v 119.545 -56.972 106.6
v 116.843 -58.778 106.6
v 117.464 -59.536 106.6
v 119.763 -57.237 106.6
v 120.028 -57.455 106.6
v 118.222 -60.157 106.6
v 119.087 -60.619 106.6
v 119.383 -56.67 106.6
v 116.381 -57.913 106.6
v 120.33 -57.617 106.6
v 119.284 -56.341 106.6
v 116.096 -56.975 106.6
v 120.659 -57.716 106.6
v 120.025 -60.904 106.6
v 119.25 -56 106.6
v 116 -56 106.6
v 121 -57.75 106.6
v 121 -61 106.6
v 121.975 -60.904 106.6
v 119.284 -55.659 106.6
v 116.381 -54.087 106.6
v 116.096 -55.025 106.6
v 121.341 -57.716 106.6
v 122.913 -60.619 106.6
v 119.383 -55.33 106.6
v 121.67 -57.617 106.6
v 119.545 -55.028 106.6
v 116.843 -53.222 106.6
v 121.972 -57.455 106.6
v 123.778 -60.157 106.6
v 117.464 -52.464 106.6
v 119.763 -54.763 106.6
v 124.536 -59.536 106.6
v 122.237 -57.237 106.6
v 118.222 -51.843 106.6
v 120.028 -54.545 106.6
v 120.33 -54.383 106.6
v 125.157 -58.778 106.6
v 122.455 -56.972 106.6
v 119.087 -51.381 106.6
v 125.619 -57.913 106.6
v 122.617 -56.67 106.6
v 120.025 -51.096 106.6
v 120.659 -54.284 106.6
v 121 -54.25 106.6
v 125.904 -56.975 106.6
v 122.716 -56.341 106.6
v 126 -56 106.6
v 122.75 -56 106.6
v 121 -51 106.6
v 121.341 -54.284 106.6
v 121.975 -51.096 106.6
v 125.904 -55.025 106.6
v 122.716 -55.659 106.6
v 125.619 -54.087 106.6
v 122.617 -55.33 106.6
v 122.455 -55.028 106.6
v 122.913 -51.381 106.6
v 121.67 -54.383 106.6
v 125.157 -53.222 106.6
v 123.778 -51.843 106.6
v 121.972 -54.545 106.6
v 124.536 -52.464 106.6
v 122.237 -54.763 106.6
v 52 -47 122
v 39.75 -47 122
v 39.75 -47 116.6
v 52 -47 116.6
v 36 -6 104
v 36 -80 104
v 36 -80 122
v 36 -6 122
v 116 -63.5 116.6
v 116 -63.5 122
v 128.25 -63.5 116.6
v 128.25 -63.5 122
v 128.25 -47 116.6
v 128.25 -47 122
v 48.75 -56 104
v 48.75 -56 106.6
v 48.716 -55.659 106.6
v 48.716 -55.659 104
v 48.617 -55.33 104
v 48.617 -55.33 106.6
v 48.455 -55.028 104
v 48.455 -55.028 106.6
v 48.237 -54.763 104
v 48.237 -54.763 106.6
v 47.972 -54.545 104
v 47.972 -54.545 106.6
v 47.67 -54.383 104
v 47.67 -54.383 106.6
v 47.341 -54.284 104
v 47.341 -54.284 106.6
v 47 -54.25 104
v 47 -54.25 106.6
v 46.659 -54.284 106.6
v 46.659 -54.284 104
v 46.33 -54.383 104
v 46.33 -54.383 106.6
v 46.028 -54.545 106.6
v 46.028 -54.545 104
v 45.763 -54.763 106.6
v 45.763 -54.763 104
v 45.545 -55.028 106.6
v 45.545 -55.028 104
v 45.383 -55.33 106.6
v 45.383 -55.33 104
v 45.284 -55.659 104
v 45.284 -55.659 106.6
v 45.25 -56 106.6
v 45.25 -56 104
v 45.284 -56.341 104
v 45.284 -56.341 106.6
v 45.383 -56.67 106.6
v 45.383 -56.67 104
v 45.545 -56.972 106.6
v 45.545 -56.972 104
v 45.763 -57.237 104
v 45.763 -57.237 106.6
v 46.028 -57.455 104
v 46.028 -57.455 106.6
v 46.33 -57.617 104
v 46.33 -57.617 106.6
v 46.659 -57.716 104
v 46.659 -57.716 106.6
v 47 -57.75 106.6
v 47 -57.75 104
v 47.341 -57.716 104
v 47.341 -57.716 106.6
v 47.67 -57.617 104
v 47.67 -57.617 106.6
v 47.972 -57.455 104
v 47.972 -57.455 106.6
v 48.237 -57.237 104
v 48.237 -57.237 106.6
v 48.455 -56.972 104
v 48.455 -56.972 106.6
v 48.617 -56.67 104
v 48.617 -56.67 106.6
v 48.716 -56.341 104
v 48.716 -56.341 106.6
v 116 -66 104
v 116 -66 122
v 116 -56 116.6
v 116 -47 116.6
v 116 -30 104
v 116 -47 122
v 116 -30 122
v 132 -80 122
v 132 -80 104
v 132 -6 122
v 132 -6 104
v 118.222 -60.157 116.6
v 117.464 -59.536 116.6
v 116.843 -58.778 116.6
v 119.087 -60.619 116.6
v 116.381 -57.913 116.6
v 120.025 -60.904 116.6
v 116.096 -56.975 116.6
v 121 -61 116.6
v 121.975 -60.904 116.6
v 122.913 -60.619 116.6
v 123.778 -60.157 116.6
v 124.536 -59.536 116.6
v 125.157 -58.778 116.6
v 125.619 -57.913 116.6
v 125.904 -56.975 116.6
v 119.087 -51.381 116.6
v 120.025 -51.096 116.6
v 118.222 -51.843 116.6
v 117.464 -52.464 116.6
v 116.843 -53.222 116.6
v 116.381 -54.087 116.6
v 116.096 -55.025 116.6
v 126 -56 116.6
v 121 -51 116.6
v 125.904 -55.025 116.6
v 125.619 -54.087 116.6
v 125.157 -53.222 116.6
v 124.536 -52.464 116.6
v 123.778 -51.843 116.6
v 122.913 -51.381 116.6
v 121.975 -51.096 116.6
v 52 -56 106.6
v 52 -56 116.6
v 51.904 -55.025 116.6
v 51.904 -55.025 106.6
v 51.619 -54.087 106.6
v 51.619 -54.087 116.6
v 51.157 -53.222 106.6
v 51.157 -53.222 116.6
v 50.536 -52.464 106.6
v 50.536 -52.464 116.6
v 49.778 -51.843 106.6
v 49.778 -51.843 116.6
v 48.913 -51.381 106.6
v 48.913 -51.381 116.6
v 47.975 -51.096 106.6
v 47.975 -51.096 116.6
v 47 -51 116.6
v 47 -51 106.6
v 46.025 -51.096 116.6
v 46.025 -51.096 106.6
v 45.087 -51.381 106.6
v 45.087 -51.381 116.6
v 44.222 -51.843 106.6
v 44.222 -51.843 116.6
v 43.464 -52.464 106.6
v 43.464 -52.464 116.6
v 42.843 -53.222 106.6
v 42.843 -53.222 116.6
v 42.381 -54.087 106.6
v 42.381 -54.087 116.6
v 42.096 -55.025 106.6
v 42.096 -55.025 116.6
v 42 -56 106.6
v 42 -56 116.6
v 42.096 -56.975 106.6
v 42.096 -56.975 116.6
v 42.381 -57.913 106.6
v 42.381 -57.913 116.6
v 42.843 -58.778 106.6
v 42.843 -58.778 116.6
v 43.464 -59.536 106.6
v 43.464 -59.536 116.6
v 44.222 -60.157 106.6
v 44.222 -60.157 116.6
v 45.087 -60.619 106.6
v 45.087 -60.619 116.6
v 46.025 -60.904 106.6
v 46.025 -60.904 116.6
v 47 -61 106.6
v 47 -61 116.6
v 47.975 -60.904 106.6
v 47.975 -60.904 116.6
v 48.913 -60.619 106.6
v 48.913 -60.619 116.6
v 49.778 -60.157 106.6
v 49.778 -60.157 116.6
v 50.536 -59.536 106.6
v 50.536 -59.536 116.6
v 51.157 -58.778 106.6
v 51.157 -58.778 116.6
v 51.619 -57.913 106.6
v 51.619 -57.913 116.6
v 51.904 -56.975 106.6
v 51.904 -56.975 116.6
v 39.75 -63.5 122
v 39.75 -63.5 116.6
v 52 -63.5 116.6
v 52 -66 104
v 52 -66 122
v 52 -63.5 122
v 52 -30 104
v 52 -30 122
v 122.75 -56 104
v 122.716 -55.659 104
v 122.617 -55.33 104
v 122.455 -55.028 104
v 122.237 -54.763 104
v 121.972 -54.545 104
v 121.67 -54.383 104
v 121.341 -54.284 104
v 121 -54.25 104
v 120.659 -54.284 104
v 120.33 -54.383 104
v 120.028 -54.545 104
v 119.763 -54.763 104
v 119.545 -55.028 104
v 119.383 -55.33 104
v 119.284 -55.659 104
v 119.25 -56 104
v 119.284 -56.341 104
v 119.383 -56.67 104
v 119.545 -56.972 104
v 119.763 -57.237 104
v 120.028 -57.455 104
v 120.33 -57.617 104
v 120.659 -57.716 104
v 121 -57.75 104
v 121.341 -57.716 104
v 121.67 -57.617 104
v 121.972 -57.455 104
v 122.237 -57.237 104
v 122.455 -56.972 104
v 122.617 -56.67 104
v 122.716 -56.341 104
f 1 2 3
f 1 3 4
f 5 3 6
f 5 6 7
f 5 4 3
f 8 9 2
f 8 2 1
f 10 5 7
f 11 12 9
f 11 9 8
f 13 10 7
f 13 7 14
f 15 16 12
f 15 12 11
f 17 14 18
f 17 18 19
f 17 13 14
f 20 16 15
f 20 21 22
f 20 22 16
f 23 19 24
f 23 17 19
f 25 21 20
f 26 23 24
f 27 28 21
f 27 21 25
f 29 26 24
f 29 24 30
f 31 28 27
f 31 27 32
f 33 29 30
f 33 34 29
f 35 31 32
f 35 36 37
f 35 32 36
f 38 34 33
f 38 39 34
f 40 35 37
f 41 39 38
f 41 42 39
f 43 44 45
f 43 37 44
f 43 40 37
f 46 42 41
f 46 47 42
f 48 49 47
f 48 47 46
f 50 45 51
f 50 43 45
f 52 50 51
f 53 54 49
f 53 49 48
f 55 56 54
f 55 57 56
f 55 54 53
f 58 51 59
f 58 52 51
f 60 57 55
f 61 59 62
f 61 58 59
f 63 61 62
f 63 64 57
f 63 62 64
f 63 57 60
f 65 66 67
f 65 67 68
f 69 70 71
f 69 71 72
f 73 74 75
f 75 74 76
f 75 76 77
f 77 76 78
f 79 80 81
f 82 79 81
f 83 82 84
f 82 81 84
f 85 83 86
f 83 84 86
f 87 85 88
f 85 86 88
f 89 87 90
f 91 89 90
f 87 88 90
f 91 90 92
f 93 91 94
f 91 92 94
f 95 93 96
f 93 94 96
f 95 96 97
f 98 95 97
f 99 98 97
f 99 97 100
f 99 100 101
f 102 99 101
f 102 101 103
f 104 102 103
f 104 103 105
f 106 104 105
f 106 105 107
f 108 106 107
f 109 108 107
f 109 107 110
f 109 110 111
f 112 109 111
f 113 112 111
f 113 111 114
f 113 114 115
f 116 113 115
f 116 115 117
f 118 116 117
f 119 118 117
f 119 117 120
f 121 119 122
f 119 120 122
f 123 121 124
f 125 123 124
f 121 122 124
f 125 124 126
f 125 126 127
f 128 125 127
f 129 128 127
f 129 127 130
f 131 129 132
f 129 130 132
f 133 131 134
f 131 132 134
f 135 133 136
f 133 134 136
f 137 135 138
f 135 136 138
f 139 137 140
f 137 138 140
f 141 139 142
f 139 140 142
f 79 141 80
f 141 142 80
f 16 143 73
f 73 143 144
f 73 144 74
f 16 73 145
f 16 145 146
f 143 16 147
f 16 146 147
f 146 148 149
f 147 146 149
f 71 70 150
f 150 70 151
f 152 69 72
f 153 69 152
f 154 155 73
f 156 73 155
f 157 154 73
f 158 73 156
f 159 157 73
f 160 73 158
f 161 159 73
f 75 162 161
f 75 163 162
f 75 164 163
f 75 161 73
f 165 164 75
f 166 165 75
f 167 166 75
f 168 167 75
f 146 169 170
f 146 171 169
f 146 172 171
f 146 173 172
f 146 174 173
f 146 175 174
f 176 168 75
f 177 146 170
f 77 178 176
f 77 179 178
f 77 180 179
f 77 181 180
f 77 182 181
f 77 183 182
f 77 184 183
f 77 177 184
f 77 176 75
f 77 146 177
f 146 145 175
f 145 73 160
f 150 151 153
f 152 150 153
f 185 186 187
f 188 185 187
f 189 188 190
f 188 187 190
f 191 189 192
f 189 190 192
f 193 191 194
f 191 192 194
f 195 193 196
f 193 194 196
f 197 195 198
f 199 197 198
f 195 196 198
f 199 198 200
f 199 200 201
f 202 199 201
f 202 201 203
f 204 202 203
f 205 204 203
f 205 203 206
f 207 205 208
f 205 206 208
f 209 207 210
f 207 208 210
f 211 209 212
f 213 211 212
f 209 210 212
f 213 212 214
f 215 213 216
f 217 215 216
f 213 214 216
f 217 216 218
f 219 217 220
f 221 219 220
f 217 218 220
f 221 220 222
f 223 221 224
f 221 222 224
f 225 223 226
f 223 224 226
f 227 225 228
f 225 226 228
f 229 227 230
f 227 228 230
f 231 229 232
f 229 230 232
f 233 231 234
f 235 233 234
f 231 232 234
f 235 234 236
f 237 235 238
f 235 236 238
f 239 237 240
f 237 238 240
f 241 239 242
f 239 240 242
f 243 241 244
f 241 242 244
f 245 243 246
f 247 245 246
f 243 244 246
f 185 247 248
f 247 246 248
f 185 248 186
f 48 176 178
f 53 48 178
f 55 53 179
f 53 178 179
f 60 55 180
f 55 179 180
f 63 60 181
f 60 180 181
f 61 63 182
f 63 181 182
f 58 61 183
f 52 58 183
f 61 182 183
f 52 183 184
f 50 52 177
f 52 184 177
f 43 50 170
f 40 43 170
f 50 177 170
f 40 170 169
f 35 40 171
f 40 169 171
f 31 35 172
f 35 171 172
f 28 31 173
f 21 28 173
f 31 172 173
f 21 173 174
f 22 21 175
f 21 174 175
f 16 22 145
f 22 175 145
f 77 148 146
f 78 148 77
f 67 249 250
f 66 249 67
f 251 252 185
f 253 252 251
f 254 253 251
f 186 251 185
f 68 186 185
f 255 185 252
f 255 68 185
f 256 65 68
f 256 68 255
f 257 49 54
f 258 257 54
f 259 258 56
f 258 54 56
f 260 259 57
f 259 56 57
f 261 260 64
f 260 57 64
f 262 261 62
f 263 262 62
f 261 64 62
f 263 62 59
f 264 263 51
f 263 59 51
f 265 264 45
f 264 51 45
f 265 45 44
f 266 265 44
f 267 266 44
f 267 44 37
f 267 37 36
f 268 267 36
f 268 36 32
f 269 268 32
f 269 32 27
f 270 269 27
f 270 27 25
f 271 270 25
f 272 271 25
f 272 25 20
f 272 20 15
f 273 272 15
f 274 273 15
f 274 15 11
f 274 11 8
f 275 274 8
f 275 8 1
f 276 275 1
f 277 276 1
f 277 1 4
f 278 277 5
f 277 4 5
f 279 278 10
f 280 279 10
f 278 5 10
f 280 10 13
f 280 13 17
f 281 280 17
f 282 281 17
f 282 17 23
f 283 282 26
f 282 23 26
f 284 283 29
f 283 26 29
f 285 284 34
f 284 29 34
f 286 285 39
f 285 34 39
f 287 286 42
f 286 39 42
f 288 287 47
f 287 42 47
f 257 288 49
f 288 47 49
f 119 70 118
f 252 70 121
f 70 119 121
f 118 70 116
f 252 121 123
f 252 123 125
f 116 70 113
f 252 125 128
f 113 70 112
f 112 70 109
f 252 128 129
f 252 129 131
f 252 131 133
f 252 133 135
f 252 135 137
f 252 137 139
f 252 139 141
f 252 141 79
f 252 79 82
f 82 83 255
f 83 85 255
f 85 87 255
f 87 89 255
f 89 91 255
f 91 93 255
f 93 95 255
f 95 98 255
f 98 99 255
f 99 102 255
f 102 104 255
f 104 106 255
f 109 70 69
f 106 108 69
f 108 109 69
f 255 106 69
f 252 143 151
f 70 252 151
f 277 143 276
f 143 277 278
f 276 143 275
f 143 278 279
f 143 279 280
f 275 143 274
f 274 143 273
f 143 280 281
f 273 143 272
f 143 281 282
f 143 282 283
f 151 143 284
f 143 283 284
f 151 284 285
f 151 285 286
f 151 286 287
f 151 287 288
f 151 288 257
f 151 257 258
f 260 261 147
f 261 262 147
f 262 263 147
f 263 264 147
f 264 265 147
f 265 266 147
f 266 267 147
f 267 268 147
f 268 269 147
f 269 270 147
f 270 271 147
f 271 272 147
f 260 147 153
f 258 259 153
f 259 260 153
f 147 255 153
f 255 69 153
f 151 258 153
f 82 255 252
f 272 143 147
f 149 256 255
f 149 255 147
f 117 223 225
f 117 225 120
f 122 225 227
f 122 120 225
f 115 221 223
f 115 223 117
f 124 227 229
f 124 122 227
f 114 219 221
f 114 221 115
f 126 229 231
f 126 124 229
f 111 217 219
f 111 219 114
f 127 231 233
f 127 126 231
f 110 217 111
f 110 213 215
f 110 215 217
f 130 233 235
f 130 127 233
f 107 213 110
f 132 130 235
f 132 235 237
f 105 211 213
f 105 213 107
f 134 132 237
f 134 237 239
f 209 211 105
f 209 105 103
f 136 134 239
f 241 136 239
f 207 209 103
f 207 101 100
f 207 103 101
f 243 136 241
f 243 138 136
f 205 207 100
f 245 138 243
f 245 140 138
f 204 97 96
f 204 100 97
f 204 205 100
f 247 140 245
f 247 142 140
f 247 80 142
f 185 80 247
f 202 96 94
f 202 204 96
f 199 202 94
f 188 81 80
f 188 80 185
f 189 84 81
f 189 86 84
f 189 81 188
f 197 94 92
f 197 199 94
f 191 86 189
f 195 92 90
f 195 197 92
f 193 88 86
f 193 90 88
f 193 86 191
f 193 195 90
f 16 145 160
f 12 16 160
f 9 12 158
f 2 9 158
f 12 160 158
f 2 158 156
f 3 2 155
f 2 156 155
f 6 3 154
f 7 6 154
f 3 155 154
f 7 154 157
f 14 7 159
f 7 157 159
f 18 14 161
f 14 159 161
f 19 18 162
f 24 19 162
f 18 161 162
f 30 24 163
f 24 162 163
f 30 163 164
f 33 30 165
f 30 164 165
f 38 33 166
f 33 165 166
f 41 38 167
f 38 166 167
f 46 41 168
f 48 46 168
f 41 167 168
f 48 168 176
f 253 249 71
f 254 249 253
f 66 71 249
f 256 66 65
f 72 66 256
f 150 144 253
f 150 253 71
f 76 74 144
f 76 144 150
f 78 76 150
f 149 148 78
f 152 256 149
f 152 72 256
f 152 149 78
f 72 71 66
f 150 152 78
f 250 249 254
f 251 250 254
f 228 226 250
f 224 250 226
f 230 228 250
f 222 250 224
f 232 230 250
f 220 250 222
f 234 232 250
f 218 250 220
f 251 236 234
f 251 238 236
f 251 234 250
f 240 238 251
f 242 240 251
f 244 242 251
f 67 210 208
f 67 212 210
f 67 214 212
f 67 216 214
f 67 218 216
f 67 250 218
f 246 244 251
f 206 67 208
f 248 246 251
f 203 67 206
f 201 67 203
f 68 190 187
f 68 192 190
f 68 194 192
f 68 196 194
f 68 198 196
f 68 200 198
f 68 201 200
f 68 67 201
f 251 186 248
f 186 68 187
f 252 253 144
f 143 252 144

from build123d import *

# Parameters (mm, degrees)
BOX007_W        = 96
BOX007_H        = 74
BOX007_DEPTH    = 18
SKETCH047_R     = 1.75
POCKET015_DEPTH = 18.001
SKETCH048_W     = 64
SKETCH048_H     = 36
POCKET016_DEPTH = 18.001
SKETCH049_W     = 88.5
SKETCH049_H     = 16.5
POCKET017_DEPTH = 5.4
SKETCH050_R     = 5
POCKET018_DEPTH = 10


with BuildPart() as part:
    # Box007 → Box007 (new body)
    with BuildSketch(Plane(origin=(36, -80, 104), x_dir=(1, 0, 0), z_dir=(0, 0, 1))):
        with Locations((48, 37)):
            Rectangle(BOX007_W, BOX007_H)
    extrude(amount=BOX007_DEPTH)

    # Sketch047 → Pocket015 (cut, through all)
    with BuildSketch(Plane(origin=(36, -80, 122), x_dir=(1, 0, 0), z_dir=(0, 0, 1))):
        with Locations((11, 24)):
            Circle(SKETCH047_R)
        with Locations((85, 24)):
            Circle(SKETCH047_R)
    extrude(amount=-POCKET015_DEPTH, mode=Mode.SUBTRACT)

    # Sketch048 → Pocket016 (cut, through all)
    with BuildSketch(Plane(origin=(36, -80, 122), x_dir=(1, 0, 0), z_dir=(0, 0, 1))):
        with Locations((48, 32)):
            Rectangle(SKETCH048_W, SKETCH048_H)
    extrude(amount=-POCKET016_DEPTH, mode=Mode.SUBTRACT)

    # Sketch049 → Pocket017 (cut)
    with BuildSketch(Plane(origin=(36, -80, 122), x_dir=(1, 0, 0), z_dir=(0, 0, 1))):
        with Locations((48, 24.75)):
            Rectangle(SKETCH049_W, SKETCH049_H)
    extrude(amount=-POCKET017_DEPTH, mode=Mode.SUBTRACT)

    # Sketch050 → Pocket018 (cut)
    with BuildSketch(Plane(origin=(36, -80, 116.6), x_dir=(1, 0, 0), z_dir=(0, 0, 1))):
        with Locations((11, 24)):
            Circle(SKETCH050_R)
        with Locations((85, 24)):
            Circle(SKETCH050_R)
    extrude(amount=-POCKET018_DEPTH, mode=Mode.SUBTRACT)


solid = part.part
